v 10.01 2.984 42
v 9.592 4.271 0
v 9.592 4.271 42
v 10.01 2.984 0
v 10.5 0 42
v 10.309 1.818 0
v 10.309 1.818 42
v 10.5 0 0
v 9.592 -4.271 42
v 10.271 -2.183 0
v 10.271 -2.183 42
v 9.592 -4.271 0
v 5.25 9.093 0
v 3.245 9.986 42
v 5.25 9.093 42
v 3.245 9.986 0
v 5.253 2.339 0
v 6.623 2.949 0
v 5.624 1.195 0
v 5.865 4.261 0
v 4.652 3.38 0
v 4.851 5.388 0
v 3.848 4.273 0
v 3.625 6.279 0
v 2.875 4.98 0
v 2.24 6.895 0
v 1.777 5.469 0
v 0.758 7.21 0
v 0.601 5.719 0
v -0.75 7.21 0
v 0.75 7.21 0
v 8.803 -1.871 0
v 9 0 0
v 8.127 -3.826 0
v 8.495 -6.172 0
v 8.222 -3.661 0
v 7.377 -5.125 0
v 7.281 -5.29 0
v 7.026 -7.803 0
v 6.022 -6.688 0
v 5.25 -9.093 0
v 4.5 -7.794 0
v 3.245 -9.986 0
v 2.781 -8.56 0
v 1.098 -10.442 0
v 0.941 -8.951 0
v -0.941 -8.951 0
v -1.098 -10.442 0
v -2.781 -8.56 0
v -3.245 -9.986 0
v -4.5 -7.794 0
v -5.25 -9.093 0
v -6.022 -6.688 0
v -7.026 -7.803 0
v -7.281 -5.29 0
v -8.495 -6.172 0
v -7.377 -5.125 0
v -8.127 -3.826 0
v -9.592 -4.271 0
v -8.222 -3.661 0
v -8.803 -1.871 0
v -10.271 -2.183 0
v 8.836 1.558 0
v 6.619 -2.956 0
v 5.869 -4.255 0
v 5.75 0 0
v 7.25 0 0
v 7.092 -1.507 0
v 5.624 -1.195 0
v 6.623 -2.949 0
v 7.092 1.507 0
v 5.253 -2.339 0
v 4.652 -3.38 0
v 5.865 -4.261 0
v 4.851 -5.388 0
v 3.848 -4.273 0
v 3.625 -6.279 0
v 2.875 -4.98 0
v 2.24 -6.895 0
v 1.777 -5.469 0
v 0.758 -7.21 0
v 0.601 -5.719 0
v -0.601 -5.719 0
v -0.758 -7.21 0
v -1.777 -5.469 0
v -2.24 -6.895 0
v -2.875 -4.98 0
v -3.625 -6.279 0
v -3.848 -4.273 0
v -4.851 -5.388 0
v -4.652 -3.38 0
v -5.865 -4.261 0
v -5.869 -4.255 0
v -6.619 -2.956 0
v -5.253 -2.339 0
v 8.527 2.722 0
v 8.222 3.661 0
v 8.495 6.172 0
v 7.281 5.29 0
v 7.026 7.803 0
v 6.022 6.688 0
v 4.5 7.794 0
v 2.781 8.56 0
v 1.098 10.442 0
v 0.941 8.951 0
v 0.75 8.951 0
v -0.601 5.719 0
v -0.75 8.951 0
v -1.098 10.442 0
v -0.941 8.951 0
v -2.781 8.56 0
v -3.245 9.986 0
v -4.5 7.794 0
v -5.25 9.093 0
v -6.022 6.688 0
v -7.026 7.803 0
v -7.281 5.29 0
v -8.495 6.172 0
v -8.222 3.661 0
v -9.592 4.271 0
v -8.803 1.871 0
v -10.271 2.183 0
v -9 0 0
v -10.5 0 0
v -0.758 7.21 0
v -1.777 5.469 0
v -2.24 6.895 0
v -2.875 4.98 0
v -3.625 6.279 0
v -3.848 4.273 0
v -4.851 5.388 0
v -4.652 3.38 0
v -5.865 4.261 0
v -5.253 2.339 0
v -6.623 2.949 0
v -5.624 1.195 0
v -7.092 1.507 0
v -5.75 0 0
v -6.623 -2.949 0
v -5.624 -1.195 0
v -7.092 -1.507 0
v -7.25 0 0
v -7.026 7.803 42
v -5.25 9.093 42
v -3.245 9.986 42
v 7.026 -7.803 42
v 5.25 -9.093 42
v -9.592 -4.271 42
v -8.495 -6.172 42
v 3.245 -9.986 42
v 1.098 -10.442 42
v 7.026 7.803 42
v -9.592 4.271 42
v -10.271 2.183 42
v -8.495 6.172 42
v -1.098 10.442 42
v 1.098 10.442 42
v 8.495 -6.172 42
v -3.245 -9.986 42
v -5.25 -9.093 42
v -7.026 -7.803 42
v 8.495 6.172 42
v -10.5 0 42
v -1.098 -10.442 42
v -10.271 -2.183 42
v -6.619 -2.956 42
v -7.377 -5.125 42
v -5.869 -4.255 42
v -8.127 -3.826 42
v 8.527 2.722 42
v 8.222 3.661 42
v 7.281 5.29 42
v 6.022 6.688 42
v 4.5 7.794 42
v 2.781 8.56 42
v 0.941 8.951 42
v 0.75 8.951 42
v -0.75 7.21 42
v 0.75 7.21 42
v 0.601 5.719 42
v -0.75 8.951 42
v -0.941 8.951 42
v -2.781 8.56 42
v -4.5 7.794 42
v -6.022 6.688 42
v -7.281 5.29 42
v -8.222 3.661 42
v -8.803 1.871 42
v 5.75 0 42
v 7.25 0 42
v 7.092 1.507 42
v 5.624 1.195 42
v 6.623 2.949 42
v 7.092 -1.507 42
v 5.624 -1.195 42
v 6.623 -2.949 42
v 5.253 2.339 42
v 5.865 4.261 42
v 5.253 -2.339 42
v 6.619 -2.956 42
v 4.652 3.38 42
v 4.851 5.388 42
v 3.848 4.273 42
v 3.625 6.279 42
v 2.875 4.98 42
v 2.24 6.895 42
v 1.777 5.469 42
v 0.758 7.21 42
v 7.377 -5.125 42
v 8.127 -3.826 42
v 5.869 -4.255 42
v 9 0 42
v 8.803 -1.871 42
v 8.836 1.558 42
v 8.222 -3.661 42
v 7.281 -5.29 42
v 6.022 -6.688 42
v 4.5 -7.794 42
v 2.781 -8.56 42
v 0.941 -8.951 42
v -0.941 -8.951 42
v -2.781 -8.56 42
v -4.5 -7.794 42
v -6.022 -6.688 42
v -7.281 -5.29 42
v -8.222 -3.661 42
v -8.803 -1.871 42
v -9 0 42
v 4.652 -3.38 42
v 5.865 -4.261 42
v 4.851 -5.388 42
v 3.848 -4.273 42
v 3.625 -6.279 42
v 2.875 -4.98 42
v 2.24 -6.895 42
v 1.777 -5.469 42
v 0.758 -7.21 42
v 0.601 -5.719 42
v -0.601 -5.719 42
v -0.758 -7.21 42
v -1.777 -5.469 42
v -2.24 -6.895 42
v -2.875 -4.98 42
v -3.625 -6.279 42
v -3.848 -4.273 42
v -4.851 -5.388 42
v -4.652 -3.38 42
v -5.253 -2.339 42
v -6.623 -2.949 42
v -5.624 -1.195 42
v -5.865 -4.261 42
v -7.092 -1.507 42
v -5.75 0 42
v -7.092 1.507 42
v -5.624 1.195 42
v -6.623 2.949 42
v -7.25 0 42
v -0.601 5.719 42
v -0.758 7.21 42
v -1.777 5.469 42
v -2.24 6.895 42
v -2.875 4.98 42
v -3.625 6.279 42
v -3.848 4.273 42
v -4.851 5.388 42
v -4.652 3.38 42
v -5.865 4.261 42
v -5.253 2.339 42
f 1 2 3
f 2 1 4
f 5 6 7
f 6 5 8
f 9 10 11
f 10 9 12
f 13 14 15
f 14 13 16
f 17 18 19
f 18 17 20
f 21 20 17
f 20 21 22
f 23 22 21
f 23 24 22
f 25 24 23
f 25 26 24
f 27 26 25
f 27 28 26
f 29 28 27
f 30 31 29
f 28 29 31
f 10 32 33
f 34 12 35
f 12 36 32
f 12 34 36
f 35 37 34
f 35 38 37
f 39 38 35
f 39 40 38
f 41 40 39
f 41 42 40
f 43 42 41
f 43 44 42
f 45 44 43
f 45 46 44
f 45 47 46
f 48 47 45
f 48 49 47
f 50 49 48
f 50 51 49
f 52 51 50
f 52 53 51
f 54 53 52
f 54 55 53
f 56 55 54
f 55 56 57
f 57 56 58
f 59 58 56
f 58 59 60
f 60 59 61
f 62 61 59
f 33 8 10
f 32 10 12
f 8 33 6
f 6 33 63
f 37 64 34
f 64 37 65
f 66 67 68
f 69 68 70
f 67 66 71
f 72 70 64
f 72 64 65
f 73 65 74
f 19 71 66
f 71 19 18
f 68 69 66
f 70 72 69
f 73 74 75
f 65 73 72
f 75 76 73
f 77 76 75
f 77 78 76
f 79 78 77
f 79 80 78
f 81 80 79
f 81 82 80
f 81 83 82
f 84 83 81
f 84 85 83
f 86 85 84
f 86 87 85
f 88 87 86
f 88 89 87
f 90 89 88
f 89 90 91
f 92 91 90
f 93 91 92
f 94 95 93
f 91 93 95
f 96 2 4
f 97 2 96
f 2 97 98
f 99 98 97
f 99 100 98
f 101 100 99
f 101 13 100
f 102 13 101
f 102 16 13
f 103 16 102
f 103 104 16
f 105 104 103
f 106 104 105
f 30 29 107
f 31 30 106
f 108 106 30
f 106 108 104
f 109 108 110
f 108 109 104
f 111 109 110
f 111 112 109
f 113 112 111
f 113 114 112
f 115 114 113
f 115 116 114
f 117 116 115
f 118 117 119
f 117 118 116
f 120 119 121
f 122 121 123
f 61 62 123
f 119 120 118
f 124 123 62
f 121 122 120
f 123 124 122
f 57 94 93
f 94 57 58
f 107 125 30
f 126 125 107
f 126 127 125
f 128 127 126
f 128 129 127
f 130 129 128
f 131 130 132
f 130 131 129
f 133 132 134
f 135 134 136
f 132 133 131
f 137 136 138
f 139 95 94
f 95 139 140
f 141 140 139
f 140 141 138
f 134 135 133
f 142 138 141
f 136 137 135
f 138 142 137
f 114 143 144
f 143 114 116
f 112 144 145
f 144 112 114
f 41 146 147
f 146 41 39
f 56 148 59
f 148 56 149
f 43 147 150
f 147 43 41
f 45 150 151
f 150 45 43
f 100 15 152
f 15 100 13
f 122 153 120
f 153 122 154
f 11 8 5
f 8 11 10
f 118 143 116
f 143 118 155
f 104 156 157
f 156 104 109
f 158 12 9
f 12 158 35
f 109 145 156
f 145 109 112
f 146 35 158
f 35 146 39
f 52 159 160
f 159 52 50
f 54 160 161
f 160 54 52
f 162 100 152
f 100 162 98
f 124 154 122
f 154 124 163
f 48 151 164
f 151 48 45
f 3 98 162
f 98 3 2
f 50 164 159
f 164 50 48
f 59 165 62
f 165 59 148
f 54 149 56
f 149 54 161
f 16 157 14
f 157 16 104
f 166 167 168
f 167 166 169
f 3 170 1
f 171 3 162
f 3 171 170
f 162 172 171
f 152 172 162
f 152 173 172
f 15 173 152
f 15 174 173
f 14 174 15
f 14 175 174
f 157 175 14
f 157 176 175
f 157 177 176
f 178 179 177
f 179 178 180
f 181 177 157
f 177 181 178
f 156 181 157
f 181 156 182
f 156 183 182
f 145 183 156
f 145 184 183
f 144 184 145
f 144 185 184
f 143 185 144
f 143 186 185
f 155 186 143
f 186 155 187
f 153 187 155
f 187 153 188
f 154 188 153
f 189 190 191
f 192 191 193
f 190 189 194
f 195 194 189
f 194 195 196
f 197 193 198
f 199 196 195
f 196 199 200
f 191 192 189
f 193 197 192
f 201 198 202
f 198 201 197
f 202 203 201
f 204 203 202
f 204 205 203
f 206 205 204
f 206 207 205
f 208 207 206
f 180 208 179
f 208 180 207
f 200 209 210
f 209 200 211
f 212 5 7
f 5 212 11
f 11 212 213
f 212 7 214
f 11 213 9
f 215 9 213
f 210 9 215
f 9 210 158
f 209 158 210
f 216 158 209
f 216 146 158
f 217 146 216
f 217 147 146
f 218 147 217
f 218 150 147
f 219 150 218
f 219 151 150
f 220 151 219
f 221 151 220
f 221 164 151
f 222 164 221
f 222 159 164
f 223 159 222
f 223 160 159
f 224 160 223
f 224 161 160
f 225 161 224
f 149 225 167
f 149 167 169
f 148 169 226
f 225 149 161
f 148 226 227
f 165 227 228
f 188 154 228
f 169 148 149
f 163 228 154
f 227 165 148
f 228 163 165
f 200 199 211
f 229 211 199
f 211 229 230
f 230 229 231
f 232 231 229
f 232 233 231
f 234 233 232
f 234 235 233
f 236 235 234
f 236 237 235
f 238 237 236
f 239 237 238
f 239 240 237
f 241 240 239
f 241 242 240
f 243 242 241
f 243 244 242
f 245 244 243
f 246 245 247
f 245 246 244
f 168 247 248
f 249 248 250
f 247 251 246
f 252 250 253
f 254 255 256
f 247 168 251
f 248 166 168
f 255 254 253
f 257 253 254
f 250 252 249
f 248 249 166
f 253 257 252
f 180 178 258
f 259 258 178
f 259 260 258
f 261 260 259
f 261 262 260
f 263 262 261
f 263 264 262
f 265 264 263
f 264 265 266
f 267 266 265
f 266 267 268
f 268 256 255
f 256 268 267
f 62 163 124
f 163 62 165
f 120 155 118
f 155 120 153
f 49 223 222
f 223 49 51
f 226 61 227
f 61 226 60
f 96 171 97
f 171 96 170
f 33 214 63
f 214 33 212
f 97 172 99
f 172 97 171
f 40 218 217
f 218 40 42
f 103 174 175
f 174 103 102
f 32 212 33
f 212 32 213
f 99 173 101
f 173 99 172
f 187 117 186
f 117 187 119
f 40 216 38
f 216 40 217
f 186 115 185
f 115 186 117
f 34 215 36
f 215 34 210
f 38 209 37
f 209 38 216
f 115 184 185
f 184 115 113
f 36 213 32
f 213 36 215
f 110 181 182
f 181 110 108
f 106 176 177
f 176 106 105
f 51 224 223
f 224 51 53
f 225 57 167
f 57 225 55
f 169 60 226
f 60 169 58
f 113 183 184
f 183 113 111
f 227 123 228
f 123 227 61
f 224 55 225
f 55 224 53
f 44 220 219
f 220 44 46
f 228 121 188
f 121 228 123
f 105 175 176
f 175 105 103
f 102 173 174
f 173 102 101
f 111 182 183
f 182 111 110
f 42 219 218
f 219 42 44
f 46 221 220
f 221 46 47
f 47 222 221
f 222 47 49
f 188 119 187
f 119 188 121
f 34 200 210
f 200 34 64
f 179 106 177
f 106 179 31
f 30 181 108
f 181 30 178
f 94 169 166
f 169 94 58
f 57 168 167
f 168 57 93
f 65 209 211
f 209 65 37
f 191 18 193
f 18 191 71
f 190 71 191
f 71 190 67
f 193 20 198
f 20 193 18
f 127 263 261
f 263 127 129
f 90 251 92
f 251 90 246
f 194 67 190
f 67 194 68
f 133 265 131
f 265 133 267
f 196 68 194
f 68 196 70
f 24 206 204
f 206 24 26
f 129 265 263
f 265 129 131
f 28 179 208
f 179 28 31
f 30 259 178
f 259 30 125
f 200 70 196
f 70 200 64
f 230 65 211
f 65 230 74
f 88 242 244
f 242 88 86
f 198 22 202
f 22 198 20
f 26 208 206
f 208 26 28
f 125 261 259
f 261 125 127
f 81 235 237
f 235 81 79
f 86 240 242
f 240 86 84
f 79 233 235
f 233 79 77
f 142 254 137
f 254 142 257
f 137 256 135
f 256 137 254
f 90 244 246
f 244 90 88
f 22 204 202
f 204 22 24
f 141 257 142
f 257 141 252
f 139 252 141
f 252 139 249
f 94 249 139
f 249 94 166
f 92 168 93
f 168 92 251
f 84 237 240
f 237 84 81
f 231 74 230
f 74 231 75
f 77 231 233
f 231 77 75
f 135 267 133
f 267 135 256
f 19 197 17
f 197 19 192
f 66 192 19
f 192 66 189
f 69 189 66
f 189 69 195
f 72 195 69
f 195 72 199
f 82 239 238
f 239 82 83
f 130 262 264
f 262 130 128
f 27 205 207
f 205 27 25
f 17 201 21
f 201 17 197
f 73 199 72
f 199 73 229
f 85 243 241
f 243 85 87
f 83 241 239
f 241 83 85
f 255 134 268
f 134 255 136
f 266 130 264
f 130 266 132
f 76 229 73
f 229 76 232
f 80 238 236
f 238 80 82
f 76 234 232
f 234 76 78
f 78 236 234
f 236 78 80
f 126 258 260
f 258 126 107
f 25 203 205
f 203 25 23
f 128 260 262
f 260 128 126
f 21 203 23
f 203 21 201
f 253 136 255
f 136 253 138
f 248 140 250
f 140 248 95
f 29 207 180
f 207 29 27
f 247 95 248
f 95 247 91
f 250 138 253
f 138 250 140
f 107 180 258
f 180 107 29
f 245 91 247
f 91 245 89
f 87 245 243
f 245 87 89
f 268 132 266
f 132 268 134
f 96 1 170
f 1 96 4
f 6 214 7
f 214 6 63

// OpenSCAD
// file: ../Modules/Shapes/propeller.scad
/**
 * Dibuja las palas de una hélice recta.
 *
 * @param diameter  Diámetro de la hélice.
 * @param height    Altura de las palas.
 * @param thickness Grosor de las paredes de las palas.
 * @param angles    Ángulos de las palas.
 *
 * @author  Joaquín Fernández
 * @url     https://gitlab.com/joaquinfq/openscad/blob/master/Modules/Shapes/propeller.scad
 * @license CC-BY-NC-4.0
 */
module propeller(diameter, height, thickness = 1.2, angles = [ 0, 60, 120, 180, 240, 300 ])
{
    // Dibujamos las palas
    for (angle = angles)
    {
        rotate([0, 0, angle])
        {
            translate([ - thickness / 2, 0, 0 ])
            {
                cube([ thickness, diameter / 2, height ]);
            }
        }
    }
    // Redondeado de la unión.
    translate([ 0, 0, height / 2 ])
    {
        cylinder(d = thickness, h = height, center = true);
    }
}
// file: ../Modules/Shapes/oval.scad
/**
 * Genera un óvalo.
 *
 * @param radius Radio de los círculos de los extremos del óvalo (Eje Y).
 * @param width  Ancho del óvalo (Eje X).
 * @param length Altura del óvalo (Eje Z).
 *
 * @author  Joaquín Fernández
 * @url     https://gitlab.com/joaquinfq/openscad/blob/master/Shapes/oval.scad
 * @license CC-BY-NC-4.0
 */
module oval(radius, width, length)
{
    translate([ -width / 2, 0, 0])
    {
        hull()
        {
            translate([ radius, 0, 0 ])
            {
                cylinder(r = radius, h = length);
            }
            translate([ width - radius, 0, 0 ])
            {
                cylinder(r = radius, h = length);
            }
        }
    }
}
// file: ../Modules/Cylinder/spool.scad
use <./hollow.scad>
use <../Shapes/propeller.scad>
/**
 * Dibuja un clindro que puede ser usado para enrollar papel, filamento, etc.
 * Se le puede poner un agujero central para colocarle un tornillo.
 *
 * @param diameter  Diámetro del cilindo.
 * @param height    Altura del cilindro.
 * @param thickness Grosor de las paredes del cilindro.
 * @param rod       Diámetro del tornillo central.
 * @param angles    Listado de ángulos de los soportes.
 *
 * @author  Joaquín Fernández
 * @url     https://gitlab.com/joaquinfq/openscad/blob/master/Modules/Cylinder/spool.scad
 * @license CC-BY-NC-4.0
 */
module spool(diameter, height, thickness, rod, angles = [])
{
    difference()
    {
        union()
        {
            cylinderHollow(diameter, height, thickness);
            propeller(diameter - thickness / 2, height, thickness, angles);
        }
        if (rod)
        {
            translate([ 0, 0, height / 2 ])
            {
                cylinder(d = rod, h = height, center = true);
            }
        }
    }
    if (rod)
    {
        cylinderHollow(rod + thickness, height, thickness);
    }
}
// file: ../Modules/Cylinder/hollow.scad
use <../Shapes/propeller.scad>
/**
 * Dibuja un clindro con un agujero concéntrico como en una tubería
 * teniendo la posibilidad de realizar muescas en las paredes.
 *
 * @param {Number}   diameter  Diámetro del cilindro.
 * @param {Number}   height    Altura del cilindro.
 * @param {Number}   thickness Grosor de las paredes del cilindro.
 * @param {Number[]} angles    Ángulos de las muescas o un array
 *                             vacío para hacer las paredes sólidas.
 *
 * @author  Joaquín Fernández
 * @url     https://gitlab.com/joaquinfq/openscad/blob/master/Modules/Cylinder/hollow.scad
 * @license CC-BY-NC-4.0
 */
module cylinderHollow(diameter, height, thickness = 1, angles = [])
{
    if (diameter && height && thickness)
    {
        difference()
        {
            cylinder(d = diameter, h = height);
            cylinder(d = diameter - thickness * 2, h = height);
            if (angles)
            {
                propeller(diameter, height, thickness, angles);
            }
        }
    }
}
// file: ../Functions/Math/angles.scad
/**
 * Convierte el número de líneas que quieren dibujarse en una circunferencia
 * a un array con los ángulos que deben rotarse dichas líneas.
 *
 * @param end  Ángulo final
 * @param inc  Incremento para ir desde 0 hasta el ángulo final.
 * @param init Listado de ángulos iniciales.
 *
 * @author  Joaquín Fernández
 * @url     https://gitlab.com/joaquinfq/openscad/blob/master/Functions/Math/angles.scad
 * @license CC-BY-NC-4.0
 */
function angles(end = 360, inc = 45, init = []) = end > 0
    ? angles(end - inc, inc, concat(init, [ end - inc ]))
    : init;
// main file
/**
 * Dibuja un carrete genérico con diversos propósitos.
 *
 * @author  Joaquín Fernández
 * @url     https://gitlab.com/joaquinfq/openscad/blob/master/Home/UniversalSpool.scad
 * @license CC-BY-NC-4.0
 * @see     https://www.thingiverse.com/thing:3118330
 */
//---------------------------------------------------------------
// Variables personalizables
//---------------------------------------------------------------
bottom     = 0;   // Diámetro de la base inferior (0 para no dibujarla).
lines      = 3;   // Cantidad de líneas a usar para unir el tornillo con el tubo.
diameter   = 21;  // Diámetro externo del carrete.
height     = 42;  // Altura del tubo (0 para no dibujar el tubo).
notch      = 1.2; // Grosor de la muesca para meter el papel (0 deshabilita la muesca).
rod        = 13;  // Diámetro del tornillo central (0 para eliminarlo).
thickness  = 1.5; // Grosor de las paredes.
top        = 0;   // Diámetro de la base superior (0 para no dibujarla).
//---------------------------------------------------------------
use <../Functions/Math/angles.scad>
use <../Modules/Cylinder/hollow.scad>
use <../Modules/Cylinder/spool.scad>
use <../Modules/Shapes/oval.scad>
//---------------------------------------------------------------
/**
 * Dibuja la base del carrete.
 *
 * @param outer     Diámetro externo de la base.
 * @param inner     Diámetro interno de la base.
 * @param thickness Grosor de la base.
 * @param rod       Diámetro del tornillo central del carrete.
 * @param angles    Ángulos para dibujar las líneas de unión.
 */
module base(outer, inner, thickness, rod, angles)
{
    difference()
    {
        union()
        {
            cylinderHollow(outer, thickness, (outer - inner) / 2);
            spool(inner, thickness, thickness, rod, angles);
        }
        if (angles)
        {
            _l = outer - inner;
            _r = min(outer - inner, thickness * 2);
            _w = (_l - 4 * thickness) / 2;
            if (_l > 4 * _r + _w)
            {
                for (angle = angles)
                {
                    rotate(angle)
                    {
                        translate([ (outer - _w) / 2 - thickness, 0, 0 ])
                        {
                            oval(_r, _w, thickness);
                        }
                    }
                }
            }
        }
    }
}

$fn = 30;
//$fn = 360; // Descomentar para mayor definición.
angles = angles(360, 360 / lines);
//---------------------------------------------------------------
// Dibujo de la base
//---------------------------------------------------------------
if (bottom > diameter)
{
    translate([ 0, 0, -thickness ])
    {
        base(bottom, diameter, thickness, rod, angles);
    }
}
//---------------------------------------------------------------
// Dibujo de la tapa
//---------------------------------------------------------------
if (top > diameter)
{
    translate([ 0, 0, height ])
    {
        base(top, diameter, thickness, rod, angles);
    }
}
//---------------------------------------------------------------
// Dibujo del tubo
//---------------------------------------------------------------
if (height)
{
    difference()
    {
        spool(diameter, height, thickness, rod, angles);
        if (notch)
        {
            angle = (angles ? min(angles) : 0) + 10;
            rotate(angle)
            {
                translate([ diameter / 2 - thickness * 1.5, 0, 0 ])
                {
                    cube([ thickness * 2, notch, height ]);
                }
            }
        }
    }

}
